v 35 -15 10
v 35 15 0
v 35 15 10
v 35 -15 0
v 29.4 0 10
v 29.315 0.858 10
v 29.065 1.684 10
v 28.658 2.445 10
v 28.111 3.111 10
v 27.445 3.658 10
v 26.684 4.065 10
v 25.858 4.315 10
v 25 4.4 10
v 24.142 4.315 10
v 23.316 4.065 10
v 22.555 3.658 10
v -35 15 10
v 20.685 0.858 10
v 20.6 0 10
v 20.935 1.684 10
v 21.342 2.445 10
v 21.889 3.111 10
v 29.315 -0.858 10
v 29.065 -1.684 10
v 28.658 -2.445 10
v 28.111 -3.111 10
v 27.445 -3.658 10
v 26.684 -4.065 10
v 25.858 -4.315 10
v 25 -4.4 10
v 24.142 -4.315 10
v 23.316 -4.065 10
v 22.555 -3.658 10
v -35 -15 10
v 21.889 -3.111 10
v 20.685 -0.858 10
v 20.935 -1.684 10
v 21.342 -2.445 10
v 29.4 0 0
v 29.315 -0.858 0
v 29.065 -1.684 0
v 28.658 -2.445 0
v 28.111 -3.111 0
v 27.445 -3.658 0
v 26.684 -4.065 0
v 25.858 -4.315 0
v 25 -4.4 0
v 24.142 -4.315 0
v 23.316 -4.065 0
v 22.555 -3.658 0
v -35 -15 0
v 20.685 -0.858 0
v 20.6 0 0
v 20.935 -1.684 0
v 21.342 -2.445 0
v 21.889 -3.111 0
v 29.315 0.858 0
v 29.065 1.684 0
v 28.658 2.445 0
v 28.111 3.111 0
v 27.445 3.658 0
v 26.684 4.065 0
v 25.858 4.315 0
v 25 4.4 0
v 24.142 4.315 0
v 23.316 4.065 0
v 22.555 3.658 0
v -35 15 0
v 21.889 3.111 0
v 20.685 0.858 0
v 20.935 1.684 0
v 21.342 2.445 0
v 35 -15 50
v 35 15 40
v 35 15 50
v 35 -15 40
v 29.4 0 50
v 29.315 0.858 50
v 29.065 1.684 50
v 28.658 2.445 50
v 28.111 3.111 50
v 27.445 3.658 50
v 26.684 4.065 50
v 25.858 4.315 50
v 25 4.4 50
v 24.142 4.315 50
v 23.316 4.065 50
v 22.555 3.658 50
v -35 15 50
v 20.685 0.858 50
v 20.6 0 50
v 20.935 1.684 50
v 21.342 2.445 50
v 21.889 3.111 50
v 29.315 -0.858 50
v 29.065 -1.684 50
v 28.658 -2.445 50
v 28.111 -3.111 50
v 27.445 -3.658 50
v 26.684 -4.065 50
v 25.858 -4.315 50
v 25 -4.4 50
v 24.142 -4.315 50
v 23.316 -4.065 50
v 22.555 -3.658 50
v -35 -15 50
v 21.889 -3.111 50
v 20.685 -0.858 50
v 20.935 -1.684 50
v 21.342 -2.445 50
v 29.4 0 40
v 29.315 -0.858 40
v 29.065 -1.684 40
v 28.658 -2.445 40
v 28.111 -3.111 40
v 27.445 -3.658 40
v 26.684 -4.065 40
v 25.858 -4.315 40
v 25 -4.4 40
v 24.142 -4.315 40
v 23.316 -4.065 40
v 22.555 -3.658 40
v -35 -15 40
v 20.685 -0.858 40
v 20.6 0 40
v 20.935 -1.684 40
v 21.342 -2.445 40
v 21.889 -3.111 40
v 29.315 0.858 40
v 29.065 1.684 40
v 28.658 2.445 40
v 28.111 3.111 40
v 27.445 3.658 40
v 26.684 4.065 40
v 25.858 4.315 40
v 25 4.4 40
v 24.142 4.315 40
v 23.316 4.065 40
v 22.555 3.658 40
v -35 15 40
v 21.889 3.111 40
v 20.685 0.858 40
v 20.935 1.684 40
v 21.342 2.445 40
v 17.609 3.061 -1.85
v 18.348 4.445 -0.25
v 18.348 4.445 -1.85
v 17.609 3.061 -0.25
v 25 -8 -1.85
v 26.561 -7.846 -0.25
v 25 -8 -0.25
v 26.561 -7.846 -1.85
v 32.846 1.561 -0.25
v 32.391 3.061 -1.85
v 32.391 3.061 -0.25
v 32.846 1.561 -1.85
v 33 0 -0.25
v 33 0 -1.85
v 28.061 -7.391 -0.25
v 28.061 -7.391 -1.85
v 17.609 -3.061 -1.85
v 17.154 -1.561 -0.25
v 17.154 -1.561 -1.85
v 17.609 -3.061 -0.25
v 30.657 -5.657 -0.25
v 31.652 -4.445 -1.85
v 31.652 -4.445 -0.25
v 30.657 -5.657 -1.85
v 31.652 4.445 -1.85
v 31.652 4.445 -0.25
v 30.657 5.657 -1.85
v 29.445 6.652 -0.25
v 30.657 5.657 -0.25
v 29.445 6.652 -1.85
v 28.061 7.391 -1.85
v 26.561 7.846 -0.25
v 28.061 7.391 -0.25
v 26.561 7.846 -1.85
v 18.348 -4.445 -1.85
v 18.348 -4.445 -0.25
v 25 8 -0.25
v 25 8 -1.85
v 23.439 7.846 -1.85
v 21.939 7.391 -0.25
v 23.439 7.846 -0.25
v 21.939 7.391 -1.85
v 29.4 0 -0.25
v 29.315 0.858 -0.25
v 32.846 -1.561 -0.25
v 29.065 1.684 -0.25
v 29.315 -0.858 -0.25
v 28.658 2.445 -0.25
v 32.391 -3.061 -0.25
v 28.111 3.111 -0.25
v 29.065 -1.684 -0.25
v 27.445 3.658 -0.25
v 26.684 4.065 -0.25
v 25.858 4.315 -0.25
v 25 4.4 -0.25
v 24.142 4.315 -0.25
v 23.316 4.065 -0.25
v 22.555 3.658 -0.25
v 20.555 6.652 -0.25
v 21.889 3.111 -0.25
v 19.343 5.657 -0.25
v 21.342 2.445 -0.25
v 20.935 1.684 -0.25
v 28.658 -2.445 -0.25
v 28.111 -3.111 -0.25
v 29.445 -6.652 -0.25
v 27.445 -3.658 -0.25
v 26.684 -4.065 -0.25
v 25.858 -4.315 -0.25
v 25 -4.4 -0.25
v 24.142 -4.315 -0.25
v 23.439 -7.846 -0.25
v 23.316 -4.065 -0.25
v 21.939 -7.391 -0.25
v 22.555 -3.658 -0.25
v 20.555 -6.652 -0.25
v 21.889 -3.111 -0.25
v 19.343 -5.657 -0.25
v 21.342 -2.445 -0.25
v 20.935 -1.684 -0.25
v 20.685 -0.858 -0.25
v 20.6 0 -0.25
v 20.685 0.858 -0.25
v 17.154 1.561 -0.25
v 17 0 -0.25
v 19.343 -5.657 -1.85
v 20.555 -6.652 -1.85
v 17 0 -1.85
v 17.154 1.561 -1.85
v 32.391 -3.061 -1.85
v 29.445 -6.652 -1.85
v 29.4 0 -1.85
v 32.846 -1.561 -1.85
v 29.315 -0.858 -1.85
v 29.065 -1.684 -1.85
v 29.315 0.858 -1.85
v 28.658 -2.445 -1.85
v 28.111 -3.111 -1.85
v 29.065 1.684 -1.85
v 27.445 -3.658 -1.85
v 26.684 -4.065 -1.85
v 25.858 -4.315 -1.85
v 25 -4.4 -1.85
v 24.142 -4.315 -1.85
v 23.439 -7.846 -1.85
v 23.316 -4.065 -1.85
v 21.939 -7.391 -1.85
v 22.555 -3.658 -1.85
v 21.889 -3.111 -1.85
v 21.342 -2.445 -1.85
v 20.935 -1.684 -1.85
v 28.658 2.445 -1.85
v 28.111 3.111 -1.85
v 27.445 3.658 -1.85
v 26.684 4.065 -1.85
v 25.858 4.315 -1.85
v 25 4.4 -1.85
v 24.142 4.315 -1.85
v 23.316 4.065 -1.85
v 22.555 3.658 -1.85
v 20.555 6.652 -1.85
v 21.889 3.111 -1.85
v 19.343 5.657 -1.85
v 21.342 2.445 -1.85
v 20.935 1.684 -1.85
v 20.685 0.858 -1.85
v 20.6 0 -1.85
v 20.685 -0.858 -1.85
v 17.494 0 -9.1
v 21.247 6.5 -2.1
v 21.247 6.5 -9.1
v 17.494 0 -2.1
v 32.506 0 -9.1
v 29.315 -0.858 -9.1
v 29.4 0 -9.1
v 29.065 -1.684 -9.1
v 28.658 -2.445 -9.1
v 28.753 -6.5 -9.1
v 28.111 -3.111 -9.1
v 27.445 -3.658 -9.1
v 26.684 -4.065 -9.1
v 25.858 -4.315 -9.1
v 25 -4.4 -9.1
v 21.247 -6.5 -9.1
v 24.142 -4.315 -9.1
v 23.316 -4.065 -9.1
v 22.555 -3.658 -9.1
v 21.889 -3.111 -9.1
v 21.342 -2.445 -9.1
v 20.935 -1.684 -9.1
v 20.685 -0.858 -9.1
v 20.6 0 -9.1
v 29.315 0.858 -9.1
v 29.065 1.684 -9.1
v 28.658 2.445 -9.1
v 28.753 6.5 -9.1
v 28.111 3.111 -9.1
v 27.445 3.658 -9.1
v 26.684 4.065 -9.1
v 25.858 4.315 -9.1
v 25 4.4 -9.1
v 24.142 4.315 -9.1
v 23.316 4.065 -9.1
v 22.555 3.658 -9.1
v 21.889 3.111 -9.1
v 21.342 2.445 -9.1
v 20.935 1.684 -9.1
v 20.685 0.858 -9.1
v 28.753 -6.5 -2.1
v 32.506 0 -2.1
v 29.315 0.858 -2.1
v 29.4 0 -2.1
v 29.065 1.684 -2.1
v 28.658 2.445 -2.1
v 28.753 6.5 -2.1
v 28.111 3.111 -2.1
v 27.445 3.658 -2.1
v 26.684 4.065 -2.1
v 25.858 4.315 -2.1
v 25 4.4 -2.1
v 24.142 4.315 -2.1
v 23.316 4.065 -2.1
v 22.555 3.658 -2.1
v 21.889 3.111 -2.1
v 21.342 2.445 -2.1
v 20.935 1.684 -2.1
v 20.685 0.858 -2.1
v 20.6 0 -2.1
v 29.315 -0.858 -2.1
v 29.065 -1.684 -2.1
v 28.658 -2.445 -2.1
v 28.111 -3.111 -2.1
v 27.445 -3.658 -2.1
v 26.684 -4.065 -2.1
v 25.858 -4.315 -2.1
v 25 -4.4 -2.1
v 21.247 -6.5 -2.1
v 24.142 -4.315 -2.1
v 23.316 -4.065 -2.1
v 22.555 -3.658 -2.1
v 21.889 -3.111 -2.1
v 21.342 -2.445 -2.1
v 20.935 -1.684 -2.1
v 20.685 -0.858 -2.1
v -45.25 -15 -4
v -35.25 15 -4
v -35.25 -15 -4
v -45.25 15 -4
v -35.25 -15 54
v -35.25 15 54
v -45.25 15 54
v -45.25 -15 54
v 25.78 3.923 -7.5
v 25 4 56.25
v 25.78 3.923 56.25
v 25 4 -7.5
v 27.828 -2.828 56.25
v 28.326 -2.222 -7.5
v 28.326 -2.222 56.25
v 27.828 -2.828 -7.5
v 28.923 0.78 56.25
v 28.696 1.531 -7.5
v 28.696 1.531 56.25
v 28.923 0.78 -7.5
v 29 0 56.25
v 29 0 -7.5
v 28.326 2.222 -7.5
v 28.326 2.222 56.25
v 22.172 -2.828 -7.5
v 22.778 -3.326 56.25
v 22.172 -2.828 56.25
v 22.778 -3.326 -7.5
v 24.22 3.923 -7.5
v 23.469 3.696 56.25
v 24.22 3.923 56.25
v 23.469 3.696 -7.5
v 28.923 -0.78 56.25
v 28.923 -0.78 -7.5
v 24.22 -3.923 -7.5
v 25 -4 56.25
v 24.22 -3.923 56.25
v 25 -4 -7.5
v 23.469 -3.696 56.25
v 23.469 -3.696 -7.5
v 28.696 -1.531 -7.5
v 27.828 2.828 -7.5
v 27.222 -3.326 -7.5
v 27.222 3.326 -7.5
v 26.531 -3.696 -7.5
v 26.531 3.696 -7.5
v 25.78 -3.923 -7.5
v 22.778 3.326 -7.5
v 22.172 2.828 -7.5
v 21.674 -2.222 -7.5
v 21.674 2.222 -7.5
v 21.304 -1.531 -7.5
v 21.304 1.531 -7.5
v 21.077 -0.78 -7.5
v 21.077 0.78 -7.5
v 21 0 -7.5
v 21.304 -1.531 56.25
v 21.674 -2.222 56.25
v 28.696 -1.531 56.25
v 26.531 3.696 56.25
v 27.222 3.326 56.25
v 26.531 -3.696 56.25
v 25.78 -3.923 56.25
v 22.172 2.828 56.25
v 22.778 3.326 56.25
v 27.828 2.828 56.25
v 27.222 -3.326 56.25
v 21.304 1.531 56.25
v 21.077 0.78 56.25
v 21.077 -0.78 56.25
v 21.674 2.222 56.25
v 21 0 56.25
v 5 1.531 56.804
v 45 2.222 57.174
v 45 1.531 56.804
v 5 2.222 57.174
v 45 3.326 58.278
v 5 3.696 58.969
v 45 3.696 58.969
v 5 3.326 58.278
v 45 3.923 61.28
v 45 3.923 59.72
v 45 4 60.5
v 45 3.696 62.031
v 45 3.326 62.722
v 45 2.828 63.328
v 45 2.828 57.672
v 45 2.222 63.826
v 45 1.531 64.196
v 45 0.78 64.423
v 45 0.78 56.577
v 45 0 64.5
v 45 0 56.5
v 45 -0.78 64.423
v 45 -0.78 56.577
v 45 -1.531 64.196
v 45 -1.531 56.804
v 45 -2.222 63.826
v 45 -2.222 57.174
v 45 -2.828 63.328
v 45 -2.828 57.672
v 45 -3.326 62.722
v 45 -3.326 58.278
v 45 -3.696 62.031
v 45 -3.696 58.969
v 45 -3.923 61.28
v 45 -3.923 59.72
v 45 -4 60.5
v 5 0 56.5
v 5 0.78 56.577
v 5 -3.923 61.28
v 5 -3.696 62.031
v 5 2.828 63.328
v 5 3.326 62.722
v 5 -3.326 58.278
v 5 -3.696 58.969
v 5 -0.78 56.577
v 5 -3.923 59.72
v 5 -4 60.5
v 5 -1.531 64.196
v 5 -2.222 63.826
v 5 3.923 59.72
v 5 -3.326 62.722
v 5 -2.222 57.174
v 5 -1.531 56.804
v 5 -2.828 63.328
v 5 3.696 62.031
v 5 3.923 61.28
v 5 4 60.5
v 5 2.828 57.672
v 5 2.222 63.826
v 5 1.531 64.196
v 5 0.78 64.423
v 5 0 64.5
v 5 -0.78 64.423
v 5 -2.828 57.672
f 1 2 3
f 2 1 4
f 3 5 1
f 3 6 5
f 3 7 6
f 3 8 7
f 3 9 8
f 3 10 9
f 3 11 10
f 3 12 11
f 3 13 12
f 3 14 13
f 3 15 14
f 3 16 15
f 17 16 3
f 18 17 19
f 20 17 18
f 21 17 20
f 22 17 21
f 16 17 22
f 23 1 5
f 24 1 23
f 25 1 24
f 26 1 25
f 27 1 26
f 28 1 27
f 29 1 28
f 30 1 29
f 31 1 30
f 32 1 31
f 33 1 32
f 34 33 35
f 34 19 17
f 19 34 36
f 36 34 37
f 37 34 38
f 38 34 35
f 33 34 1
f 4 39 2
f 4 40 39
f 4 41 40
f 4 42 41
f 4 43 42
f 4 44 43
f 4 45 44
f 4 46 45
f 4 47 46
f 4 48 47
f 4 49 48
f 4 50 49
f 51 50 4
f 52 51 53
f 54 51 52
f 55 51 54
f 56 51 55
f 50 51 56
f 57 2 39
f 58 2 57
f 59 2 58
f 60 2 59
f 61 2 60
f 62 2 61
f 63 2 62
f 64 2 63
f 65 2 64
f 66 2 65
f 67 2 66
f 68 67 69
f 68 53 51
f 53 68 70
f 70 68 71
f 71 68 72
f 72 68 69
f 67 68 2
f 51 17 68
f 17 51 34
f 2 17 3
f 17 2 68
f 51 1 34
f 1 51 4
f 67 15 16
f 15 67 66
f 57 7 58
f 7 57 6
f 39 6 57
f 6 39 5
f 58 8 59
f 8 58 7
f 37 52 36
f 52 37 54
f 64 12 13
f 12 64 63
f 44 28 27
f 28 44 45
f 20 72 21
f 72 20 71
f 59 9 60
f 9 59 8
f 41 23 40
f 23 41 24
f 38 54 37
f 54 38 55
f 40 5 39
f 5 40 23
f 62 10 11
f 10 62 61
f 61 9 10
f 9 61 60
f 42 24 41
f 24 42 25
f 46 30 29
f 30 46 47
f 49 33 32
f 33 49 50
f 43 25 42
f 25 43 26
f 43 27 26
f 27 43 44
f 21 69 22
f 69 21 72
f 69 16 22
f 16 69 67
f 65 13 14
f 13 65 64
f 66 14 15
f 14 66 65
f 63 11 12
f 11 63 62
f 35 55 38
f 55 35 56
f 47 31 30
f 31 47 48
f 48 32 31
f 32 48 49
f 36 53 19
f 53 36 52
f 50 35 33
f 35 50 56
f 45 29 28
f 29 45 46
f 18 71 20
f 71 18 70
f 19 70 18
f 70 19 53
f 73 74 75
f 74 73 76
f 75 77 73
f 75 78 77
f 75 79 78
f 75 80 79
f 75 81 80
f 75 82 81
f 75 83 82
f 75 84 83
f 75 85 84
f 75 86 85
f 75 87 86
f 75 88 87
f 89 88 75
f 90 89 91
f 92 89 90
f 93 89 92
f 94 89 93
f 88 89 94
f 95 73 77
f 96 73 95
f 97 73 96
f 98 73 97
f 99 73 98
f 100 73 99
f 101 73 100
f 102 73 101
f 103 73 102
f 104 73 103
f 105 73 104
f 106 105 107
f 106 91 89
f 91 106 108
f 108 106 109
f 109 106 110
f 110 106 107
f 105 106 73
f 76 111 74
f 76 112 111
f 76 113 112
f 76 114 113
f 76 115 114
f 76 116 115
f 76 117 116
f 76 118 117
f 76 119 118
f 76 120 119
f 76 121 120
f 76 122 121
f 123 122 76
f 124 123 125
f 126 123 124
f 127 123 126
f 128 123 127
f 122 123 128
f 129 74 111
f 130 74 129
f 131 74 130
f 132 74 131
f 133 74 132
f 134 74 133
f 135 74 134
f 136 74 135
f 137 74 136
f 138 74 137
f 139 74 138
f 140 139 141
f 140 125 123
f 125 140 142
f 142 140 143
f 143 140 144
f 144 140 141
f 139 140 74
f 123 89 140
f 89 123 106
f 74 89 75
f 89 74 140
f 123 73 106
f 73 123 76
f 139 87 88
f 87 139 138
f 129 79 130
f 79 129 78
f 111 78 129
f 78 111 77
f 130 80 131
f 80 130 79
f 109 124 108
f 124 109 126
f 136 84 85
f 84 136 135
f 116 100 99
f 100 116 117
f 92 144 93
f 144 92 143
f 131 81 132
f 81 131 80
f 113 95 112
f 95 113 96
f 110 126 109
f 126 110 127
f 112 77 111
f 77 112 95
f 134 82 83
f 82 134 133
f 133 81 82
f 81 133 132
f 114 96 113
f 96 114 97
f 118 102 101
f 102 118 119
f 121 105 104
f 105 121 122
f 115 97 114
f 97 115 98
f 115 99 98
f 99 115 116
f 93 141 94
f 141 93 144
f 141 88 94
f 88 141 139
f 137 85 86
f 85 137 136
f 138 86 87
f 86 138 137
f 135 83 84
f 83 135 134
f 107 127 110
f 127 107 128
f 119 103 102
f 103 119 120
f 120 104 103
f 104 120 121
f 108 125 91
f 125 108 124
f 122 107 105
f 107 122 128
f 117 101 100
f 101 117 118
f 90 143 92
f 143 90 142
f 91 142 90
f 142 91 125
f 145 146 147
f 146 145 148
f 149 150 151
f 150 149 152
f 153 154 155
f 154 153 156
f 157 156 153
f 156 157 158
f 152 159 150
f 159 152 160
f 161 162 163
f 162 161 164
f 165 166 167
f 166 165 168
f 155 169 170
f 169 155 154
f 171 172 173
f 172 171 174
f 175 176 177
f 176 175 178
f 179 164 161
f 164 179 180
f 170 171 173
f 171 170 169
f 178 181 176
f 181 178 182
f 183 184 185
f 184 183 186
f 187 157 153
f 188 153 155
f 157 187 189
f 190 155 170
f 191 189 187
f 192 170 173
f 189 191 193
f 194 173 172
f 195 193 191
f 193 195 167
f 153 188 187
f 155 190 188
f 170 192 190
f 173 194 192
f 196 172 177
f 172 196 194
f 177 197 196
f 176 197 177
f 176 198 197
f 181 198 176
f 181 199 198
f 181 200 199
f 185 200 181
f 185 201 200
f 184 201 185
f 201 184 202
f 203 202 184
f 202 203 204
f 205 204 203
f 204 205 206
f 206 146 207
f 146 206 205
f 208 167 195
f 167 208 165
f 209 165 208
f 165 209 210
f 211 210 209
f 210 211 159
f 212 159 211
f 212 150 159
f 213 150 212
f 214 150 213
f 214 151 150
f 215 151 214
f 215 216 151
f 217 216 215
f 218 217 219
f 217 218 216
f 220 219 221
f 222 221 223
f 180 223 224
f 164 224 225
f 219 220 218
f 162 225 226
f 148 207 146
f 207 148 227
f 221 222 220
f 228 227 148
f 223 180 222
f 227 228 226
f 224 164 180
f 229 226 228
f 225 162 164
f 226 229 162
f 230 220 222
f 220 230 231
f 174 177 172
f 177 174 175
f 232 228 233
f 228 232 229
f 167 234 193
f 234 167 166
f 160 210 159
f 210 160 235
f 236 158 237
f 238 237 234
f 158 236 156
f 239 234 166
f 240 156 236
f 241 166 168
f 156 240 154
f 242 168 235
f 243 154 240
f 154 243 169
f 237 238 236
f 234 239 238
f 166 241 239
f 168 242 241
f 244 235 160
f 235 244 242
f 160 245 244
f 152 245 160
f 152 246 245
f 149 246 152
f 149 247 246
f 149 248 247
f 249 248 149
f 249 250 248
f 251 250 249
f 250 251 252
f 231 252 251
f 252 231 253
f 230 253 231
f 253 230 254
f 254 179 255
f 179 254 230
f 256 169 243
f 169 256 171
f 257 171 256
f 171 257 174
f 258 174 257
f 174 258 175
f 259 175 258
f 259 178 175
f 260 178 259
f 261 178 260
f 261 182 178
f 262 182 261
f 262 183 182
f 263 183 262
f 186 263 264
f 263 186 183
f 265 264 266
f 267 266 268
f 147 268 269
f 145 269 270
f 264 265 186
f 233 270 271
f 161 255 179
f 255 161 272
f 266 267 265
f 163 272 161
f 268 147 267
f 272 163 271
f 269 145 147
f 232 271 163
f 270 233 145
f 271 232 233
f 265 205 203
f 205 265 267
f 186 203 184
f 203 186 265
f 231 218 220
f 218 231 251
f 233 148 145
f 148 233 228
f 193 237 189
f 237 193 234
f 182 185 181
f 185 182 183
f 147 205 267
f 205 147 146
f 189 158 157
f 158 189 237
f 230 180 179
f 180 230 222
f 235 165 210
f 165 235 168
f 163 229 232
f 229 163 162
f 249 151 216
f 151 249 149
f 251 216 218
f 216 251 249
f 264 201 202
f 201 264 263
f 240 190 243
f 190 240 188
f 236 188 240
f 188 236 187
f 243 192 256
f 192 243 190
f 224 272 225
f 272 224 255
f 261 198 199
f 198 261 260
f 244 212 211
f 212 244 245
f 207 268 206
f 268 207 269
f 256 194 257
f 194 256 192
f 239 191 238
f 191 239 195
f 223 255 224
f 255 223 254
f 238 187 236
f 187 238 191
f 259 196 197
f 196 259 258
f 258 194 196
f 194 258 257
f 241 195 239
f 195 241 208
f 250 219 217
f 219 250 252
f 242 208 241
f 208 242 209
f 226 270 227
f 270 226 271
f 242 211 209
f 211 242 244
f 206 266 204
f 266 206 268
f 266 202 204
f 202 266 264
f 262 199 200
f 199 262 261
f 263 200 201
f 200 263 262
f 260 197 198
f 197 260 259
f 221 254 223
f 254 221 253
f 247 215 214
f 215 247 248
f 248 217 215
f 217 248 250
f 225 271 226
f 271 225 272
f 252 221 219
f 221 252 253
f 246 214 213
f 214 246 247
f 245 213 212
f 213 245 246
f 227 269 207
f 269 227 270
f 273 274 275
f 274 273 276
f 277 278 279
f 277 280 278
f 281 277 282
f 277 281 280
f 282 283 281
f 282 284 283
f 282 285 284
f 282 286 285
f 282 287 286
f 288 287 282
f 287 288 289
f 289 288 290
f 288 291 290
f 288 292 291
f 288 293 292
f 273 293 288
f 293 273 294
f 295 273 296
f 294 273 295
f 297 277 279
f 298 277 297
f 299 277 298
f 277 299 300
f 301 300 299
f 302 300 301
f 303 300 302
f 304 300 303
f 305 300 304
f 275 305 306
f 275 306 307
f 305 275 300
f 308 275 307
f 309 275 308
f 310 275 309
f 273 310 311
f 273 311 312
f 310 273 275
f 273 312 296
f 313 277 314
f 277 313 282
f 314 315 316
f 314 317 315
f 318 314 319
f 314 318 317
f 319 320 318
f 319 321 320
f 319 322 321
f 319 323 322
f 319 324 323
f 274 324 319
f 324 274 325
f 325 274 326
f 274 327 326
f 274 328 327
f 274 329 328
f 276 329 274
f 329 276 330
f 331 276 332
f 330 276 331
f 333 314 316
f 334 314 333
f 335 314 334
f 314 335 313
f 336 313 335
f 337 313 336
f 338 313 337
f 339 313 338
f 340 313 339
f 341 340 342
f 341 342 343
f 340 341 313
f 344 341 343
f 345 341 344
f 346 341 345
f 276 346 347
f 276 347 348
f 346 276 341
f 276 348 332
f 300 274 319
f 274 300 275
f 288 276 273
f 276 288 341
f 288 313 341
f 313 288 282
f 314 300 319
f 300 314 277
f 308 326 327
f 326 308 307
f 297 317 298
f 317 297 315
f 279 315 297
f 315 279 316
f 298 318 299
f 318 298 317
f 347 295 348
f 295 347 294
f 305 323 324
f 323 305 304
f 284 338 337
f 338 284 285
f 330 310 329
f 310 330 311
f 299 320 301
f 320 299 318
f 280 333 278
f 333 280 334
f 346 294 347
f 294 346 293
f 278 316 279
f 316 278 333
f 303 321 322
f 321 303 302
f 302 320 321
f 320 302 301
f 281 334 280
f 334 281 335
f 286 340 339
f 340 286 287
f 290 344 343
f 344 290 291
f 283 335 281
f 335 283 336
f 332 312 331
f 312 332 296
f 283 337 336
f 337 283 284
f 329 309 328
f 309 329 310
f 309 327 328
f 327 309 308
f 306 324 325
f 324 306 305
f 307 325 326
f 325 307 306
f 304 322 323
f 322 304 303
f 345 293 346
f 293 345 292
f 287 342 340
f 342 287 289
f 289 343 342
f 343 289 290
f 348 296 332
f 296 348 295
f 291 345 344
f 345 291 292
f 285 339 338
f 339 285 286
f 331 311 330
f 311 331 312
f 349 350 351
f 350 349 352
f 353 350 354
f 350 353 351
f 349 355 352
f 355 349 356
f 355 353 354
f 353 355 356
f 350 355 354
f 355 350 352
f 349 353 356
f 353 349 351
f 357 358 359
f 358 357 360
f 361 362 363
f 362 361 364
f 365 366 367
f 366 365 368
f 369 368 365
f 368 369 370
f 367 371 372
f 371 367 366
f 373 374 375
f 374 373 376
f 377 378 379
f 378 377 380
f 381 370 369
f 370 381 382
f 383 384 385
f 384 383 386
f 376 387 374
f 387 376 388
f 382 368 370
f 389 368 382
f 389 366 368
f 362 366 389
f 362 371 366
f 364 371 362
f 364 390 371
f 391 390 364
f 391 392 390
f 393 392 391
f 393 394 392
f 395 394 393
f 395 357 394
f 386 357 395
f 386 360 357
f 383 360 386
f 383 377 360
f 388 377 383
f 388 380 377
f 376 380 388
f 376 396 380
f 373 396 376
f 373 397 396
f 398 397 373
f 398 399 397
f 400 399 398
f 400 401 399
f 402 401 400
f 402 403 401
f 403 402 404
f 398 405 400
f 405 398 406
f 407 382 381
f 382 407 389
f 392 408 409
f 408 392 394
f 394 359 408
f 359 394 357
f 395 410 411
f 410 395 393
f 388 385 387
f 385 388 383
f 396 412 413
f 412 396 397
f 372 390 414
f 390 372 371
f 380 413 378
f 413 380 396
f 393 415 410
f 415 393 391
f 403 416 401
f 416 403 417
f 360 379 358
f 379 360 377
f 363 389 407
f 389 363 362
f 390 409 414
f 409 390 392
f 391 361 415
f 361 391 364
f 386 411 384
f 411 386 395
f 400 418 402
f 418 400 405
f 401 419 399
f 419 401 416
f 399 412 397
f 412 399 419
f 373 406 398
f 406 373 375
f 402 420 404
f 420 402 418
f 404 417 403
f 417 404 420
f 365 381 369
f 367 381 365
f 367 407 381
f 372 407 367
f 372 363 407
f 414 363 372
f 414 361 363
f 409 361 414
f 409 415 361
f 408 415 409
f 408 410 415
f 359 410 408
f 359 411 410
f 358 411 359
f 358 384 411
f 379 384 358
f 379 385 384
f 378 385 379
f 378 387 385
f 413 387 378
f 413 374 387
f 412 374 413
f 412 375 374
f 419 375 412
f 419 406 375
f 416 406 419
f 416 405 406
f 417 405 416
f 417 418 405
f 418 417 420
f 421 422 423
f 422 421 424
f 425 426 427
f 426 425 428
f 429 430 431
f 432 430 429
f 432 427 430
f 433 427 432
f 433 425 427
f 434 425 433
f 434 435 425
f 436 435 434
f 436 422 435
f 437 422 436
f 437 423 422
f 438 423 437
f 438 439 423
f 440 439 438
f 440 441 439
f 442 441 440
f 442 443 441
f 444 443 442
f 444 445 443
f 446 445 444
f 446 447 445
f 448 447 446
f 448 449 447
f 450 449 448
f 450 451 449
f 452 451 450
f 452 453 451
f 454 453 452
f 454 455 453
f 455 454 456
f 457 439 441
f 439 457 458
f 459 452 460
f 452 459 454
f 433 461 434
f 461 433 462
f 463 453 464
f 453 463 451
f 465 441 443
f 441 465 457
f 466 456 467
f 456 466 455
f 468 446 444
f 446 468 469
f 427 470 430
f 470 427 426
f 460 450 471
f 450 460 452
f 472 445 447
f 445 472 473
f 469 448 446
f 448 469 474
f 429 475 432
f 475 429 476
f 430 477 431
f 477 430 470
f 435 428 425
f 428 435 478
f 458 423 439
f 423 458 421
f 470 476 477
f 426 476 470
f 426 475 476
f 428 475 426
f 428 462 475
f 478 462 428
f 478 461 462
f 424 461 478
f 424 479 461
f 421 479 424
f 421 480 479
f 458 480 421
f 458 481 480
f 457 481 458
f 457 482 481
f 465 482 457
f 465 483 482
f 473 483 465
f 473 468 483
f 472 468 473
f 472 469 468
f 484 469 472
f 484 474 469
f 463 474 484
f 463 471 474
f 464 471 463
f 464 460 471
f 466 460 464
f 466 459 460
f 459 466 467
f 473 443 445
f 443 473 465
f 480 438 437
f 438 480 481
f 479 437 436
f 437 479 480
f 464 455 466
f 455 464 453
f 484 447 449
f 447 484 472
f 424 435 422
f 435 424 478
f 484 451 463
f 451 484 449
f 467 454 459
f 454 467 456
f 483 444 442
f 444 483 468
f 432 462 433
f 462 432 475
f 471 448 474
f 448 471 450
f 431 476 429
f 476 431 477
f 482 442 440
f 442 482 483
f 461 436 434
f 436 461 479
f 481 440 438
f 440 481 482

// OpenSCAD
$fn = 32;

// ------------------------------------------------------------------------
// C clamp: throat 40 mm, screw d8
// Every part is its own module, assembly() places every instance.
// ------------------------------------------------------------------------

// --- part 1 ---
module clamp_arm() {
  difference() {
    translate([-35, -15, 0]) cube([70, 30, 10]);
    translate([25, 0, -1]) cylinder(h = 12, d = 8.8);
  }
}

// --- part 2 ---
module clamp_spine() {
  difference() {
    translate([-29, -15, 0]) cube([58, 30, 10]);
  }
}

// --- part 3 ---
module clamp_screw() {
  translate([0, 0, -31.875]) cylinder(h = 63.75, d = 8);
}

// --- part 4 ---
module clamp_washer() {
  difference() {
      translate([0, 0, 0]) cylinder(h = 1.6, d = 16);
      translate([0, 0, -1]) cylinder(h = 3.6, d = 8.8);
    }
}

// --- part 5 ---
module clamp_nut() {
  difference() {
    linear_extrude(height = 7) polygon(points = [[7.506, 0], [3.753, 6.5], [-3.753, 6.5], [-7.506, 0], [-3.753, -6.5], [3.753, -6.5]]);
    translate([0, 0, -1]) cylinder(h = 9, d = 8.8);
  }
}

// --- part 6 ---
module tommy_bar() {
  translate([0, 0, -20]) cylinder(h = 40, d = 8);
}

// --- assembly ---
module assembly() {
  color([0.80, 0.24, 0.20]) translate([0, 0, 0]) rotate([0, 0, 0]) clamp_arm();
  color([0.20, 0.45, 0.75]) translate([0, 0, 40]) rotate([0, 0, 0]) clamp_arm();
  color([0.25, 0.62, 0.32]) translate([-45.25, 0, 25]) rotate([0, 90, 0]) clamp_spine();
  color([0.92, 0.70, 0.18]) translate([25, 0, 24.375]) rotate([0, 0, 0]) clamp_screw();
  color([0.58, 0.35, 0.70]) translate([25, 0, -1.85]) rotate([0, 0, 0]) clamp_washer();
  color([0.16, 0.66, 0.66]) translate([25, 0, -9.1]) rotate([0, 0, 0]) clamp_nut();
  color([0.85, 0.48, 0.18]) translate([25, 0, 60.5]) rotate([0, 90, 0]) tommy_bar();
}

assembly();
